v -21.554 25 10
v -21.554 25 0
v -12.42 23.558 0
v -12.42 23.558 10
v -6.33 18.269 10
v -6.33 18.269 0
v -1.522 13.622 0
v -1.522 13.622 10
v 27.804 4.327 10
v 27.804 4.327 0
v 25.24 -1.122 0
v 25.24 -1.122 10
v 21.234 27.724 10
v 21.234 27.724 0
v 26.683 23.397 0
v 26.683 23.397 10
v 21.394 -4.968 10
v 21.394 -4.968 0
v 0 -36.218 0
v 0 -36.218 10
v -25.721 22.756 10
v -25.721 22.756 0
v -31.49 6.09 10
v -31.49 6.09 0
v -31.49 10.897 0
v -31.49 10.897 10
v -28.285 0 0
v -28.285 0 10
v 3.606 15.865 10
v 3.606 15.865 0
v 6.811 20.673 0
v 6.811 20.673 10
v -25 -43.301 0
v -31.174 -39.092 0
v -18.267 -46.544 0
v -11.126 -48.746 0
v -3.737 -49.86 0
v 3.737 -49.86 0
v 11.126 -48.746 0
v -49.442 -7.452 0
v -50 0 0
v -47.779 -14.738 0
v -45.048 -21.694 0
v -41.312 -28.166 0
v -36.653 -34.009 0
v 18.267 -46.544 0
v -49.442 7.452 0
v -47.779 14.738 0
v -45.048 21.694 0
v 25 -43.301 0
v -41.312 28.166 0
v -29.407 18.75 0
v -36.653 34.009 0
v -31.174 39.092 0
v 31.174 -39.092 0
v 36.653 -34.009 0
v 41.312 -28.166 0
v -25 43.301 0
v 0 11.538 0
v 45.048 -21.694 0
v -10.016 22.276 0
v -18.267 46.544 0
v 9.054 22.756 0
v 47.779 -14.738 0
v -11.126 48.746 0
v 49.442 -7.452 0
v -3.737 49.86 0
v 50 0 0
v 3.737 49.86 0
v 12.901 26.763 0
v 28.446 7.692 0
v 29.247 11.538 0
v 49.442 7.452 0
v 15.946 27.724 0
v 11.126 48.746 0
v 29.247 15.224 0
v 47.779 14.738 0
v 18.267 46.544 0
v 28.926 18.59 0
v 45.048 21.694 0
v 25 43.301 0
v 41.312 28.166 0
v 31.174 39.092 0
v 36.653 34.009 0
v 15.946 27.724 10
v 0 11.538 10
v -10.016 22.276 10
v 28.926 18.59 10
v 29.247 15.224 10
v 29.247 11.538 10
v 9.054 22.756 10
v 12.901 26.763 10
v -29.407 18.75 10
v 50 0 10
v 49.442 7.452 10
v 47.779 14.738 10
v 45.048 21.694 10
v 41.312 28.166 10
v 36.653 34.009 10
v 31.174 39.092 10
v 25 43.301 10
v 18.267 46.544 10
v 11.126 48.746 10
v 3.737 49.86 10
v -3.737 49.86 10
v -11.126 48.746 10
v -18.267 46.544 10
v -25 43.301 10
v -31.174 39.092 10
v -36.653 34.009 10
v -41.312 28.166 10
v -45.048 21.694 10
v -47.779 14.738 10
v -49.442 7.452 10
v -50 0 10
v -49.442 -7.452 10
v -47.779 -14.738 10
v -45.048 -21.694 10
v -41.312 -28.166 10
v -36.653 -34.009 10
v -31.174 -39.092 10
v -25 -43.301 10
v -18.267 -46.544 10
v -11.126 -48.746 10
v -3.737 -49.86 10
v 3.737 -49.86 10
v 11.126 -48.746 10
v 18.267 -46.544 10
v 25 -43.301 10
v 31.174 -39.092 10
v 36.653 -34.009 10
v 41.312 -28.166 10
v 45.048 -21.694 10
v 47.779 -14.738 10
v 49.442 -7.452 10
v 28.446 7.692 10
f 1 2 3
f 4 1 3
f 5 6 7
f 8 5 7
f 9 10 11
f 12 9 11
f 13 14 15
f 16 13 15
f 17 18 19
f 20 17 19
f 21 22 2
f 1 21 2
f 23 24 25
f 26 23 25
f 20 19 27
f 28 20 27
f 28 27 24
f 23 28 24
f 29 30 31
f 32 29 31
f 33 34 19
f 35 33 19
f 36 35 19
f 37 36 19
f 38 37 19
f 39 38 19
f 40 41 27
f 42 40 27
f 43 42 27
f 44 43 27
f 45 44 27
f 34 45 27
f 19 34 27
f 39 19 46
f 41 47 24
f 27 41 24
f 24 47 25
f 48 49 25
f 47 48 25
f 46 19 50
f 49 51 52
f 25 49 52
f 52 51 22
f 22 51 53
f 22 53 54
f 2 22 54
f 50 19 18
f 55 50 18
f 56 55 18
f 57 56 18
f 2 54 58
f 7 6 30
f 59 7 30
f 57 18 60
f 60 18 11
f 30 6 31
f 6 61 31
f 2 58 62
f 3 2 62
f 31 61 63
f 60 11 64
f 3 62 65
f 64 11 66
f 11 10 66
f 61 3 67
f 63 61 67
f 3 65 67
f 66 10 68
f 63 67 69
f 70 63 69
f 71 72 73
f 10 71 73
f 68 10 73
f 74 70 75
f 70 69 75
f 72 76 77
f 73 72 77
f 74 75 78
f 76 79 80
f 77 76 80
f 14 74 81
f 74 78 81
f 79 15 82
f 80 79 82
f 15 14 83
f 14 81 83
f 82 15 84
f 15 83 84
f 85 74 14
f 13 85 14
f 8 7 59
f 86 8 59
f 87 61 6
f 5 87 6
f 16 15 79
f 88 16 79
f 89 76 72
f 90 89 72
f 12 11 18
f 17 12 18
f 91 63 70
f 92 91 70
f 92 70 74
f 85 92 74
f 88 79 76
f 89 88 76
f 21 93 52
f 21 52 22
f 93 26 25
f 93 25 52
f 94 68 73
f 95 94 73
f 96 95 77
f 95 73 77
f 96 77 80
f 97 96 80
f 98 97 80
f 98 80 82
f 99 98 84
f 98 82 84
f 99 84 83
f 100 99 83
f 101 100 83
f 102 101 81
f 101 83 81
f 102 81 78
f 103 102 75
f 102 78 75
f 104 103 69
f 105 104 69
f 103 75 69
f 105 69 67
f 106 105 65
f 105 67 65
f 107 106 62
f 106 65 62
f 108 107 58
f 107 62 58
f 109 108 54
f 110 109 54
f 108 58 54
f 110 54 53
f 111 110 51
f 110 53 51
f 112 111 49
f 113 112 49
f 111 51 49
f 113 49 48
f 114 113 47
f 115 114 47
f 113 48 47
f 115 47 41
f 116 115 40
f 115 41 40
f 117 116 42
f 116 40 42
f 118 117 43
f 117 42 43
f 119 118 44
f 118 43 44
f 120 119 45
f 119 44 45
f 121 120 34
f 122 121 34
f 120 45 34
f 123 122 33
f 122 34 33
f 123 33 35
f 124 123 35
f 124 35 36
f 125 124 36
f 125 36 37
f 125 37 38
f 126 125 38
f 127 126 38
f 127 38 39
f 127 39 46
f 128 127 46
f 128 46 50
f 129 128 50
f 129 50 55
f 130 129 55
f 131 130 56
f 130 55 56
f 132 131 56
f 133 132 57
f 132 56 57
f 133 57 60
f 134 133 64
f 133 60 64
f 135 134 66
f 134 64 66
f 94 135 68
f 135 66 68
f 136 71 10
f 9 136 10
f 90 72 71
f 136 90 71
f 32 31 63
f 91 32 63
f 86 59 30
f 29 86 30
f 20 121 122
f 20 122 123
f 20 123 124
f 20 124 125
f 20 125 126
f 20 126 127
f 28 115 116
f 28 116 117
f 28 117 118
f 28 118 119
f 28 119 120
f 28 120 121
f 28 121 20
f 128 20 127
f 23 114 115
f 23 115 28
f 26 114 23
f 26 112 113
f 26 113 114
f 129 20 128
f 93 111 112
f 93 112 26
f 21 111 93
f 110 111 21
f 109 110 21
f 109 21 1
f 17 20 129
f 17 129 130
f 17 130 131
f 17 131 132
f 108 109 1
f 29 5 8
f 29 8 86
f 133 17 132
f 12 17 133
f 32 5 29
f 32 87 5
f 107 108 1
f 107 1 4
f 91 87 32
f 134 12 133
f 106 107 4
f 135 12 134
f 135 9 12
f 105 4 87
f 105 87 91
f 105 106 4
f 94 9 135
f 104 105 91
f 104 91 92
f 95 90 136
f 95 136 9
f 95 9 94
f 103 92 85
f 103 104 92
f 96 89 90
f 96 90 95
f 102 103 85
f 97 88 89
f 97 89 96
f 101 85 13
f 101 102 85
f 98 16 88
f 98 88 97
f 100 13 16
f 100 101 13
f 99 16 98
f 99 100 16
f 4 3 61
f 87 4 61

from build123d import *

# Parameters (mm, degrees)
SKETCH_R      = 50
EXTRUDE_DEPTH = 10


with BuildPart() as part:
    # Sketch → Extrude (new body)
    with BuildSketch(Plane.XY):
        Circle(SKETCH_R)
        Polygon((0, -36.217949), (-28.28525, 0), (-31.490379, 6.089741), (-31.490379, 10.897434), (-29.407051, 18.75), (-25.721149, 22.756409), (-21.554483, 25), (-12.419867, 23.557693), (-10.01602, 22.275639), (-6.330123, 18.26923), (-1.522433, 13.621796), (0, 11.538464), (3.605769, 15.865385), (6.810907, 20.673079), (9.054492, 22.756409), (12.900642, 26.762819), (15.945516, 27.724361), (21.23398, 27.724361), (26.682697, 23.397434), (28.926281, 18.589741), (29.246799, 15.224361), (29.246799, 11.538464), (28.445511, 7.692307), (27.804497, 4.326921), (25.240389, -1.121795), (21.394239, -4.967949), align=None, mode=Mode.SUBTRACT)
    extrude(amount=EXTRUDE_DEPTH)


solid = part.part
